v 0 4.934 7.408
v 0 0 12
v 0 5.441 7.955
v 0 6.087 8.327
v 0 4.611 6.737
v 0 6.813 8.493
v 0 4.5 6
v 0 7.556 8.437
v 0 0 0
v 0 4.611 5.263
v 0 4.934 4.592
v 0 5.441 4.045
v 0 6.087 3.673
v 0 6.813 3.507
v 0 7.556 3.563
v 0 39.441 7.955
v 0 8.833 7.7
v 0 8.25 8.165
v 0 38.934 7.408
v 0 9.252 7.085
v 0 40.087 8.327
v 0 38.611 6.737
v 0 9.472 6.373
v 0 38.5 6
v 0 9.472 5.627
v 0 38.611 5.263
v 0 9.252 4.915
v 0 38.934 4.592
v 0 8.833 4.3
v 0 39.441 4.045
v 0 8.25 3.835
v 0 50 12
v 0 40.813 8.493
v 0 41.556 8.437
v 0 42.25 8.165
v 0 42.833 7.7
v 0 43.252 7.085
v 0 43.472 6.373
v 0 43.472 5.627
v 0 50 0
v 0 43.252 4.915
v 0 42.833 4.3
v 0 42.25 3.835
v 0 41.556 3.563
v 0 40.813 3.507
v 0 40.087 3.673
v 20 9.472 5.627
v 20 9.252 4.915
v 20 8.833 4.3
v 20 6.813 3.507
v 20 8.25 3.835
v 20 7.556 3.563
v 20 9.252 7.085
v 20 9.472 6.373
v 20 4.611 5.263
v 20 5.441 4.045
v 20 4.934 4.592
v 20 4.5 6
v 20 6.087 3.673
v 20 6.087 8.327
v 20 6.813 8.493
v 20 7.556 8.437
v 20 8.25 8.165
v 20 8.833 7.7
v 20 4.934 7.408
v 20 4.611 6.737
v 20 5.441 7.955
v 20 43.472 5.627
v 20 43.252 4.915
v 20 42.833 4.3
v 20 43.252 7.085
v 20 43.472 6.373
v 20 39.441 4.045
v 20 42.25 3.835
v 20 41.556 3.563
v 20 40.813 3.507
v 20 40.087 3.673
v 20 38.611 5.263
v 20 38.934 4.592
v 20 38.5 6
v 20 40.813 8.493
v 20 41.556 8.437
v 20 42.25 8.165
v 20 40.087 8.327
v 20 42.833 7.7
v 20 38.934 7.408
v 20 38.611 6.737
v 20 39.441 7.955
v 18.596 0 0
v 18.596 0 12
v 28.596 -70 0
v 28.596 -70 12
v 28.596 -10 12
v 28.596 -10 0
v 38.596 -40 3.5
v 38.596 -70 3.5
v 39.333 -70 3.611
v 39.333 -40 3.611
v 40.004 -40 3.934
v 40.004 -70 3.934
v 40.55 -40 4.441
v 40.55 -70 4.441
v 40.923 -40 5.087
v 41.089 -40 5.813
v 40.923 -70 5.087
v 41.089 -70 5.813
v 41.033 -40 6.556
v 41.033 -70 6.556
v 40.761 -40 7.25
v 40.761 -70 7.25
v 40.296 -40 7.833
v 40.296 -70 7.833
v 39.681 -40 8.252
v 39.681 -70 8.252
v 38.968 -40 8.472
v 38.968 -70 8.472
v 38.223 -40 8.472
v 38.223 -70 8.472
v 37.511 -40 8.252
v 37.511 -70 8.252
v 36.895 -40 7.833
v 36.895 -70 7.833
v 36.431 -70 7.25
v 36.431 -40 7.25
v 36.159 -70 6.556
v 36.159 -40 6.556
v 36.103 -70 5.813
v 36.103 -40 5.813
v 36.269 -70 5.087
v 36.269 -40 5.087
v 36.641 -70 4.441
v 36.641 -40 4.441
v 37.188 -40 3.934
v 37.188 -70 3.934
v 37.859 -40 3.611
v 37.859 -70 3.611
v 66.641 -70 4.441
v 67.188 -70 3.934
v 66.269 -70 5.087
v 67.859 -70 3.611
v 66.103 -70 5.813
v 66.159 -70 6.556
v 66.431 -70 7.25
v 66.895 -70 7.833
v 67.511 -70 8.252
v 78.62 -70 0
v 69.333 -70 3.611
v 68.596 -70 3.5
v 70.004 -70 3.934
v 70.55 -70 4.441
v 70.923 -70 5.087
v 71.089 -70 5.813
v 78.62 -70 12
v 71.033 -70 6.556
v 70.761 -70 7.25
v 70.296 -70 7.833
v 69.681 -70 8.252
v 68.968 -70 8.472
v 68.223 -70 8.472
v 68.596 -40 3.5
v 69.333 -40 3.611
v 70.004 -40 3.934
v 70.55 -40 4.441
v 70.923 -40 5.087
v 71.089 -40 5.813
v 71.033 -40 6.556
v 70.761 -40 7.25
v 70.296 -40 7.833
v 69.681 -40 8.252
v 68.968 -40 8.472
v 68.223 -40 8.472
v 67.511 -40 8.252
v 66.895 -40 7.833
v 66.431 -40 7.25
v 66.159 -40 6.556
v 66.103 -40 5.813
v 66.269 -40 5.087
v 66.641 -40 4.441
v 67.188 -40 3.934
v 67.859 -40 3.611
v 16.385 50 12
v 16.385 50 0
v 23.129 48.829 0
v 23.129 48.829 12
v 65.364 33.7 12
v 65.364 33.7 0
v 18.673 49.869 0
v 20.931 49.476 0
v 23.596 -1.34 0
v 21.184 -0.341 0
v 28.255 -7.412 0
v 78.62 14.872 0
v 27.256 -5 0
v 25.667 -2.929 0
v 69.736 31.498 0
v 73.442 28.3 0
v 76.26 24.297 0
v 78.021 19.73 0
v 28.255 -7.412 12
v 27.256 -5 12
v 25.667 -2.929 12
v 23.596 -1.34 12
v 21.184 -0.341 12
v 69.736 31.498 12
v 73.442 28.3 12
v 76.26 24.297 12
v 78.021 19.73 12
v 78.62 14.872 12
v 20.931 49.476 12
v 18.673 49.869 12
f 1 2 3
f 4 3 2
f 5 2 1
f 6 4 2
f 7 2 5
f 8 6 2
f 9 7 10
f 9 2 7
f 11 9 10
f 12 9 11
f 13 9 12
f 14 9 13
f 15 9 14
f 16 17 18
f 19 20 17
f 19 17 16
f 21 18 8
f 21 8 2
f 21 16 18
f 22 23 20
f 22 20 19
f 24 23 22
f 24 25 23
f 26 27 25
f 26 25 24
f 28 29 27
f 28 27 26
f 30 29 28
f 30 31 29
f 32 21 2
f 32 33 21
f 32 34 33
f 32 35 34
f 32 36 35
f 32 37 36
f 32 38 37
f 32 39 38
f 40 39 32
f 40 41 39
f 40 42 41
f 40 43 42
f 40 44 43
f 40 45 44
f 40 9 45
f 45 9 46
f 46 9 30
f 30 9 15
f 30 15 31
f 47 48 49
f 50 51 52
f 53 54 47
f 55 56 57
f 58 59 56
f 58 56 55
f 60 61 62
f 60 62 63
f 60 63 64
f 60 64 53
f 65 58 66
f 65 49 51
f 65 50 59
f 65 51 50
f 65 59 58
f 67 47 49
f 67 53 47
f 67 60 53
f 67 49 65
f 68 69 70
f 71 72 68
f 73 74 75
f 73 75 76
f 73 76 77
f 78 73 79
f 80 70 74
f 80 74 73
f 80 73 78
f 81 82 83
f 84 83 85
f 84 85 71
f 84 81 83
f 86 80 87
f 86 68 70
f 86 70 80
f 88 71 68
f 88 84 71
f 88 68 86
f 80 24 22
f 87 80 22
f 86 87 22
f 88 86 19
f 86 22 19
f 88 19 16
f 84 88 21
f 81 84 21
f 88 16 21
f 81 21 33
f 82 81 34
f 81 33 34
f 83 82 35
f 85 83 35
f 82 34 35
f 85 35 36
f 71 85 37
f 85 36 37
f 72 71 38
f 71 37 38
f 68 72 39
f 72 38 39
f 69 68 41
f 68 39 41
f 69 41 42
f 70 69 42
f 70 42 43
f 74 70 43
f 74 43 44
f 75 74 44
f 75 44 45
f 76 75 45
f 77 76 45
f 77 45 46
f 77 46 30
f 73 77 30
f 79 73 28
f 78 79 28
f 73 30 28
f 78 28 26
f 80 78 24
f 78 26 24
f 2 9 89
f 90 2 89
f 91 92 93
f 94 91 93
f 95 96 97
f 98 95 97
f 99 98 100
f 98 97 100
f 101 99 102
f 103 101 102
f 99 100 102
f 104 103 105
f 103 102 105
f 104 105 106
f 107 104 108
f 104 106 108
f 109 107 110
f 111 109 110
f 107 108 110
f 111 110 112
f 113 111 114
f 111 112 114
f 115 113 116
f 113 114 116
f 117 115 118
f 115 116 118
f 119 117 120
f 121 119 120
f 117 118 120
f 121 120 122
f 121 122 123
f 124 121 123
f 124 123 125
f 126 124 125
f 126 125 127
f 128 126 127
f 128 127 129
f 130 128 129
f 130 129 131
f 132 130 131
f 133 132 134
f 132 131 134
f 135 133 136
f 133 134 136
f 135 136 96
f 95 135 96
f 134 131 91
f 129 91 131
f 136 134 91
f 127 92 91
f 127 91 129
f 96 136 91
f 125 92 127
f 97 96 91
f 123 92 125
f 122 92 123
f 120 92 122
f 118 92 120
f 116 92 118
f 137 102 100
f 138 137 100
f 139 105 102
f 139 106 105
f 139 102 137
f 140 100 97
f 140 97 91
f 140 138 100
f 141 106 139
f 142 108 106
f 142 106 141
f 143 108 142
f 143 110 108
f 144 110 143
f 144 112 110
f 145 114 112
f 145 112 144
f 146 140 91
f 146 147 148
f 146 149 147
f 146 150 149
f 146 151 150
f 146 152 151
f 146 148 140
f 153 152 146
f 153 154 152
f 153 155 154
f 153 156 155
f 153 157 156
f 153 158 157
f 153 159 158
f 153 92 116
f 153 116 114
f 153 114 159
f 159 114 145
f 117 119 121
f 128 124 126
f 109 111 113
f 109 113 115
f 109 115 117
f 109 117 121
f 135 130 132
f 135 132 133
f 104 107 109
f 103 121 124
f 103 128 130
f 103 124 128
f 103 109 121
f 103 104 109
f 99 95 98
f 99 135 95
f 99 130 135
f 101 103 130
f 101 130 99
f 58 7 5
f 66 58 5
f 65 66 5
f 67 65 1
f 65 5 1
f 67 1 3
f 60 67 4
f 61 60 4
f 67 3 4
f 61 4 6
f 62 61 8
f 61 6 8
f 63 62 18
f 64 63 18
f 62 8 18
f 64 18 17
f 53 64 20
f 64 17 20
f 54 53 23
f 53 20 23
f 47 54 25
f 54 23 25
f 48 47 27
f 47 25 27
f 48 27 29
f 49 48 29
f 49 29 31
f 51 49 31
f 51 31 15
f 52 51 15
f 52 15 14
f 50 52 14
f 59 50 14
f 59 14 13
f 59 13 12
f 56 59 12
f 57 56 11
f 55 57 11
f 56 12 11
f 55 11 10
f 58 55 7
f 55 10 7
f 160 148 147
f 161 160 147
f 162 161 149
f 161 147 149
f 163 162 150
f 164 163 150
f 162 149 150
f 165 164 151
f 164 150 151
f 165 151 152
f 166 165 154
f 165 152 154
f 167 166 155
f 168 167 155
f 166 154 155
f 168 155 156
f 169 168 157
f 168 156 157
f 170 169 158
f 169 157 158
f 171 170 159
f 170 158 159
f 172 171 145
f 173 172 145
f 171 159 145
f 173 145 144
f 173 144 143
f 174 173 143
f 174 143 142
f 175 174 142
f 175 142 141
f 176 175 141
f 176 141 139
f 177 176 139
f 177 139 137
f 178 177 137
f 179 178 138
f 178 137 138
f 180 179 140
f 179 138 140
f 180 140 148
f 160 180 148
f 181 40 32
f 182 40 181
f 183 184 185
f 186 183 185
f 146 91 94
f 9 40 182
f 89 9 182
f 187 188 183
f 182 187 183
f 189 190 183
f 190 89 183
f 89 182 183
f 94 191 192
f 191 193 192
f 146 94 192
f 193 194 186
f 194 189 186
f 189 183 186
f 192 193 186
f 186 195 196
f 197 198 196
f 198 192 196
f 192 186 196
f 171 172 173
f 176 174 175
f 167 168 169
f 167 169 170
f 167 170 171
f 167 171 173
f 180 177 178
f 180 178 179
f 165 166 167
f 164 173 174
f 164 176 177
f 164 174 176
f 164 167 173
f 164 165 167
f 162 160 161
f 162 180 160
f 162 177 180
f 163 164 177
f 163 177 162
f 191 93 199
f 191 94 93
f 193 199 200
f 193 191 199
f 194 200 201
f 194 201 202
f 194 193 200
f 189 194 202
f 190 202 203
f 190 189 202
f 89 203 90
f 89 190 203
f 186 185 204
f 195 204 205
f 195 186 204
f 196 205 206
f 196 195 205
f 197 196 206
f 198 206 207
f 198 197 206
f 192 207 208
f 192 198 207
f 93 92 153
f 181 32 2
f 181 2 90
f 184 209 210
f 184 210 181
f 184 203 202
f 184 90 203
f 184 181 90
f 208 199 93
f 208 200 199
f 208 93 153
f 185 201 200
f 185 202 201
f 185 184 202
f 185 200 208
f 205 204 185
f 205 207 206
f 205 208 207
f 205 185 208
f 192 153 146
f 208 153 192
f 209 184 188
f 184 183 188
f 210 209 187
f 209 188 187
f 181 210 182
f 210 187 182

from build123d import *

# Parameters (mm, degrees)
SKETCH_1_W          = 78.62
SKETCH_1_H          = 50
EXTRUDE_1_DEPTH     = 12
SKETCH_3_W          = 50.02416134
SKETCH_3_H          = 10
CUT_EXTRUDE_1_DEPTH = 94.942026804
FILLET_3_R          = 20
FILLET_4_R          = 20
SKETCH_5_R          = 2.5
CUT_EXTRUDE_3_DEPTH = 20
SKETCH_6_W          = 50.02416134
SKETCH_6_H          = 80
EXTRUDE_2_DEPTH     = 12
FILLET_5_R          = 10
SKETCH_7_R          = 2.5
CUT_EXTRUDE_4_DEPTH = 30


with BuildPart() as part:
    # Эскиз1 → Бобышка-Вытянуть1 (new body)
    with BuildSketch(Plane.XY):
        with Locations((39.31, 25)):
            Rectangle(SKETCH_1_W, SKETCH_1_H)
    extrude(amount=EXTRUDE_1_DEPTH)

    # Эскиз3 → Вырез-Вытянуть1 (cut, through all)
    with BuildSketch(Plane.XY.offset(12)):
        Polygon((19.858926821, 50), (78.62, 28.952063791), (78.62, 50), align=None)
        with Locations((53.60791933, 5)):
            Rectangle(SKETCH_3_W, SKETCH_3_H)
    extrude(amount=-CUT_EXTRUDE_1_DEPTH, mode=Mode.SUBTRACT)

    # Скругление3
    fillet_3_edges = [part.edges().sort_by_distance(p)[0] for p in [
        (78.62, 28.952063791, 6),
    ]]
    fillet(fillet_3_edges, radius=FILLET_3_R)

    # Скругление4
    fillet_4_edges = [part.edges().sort_by_distance(p)[0] for p in [
        (19.858926821, 50, 6),
    ]]
    fillet(fillet_4_edges, radius=FILLET_4_R)

    # Эскиз5 → Вырез-Вытянуть3 (cut)
    with BuildSketch(Plane.ZY):
        with Locations(Location((6, 7, 0), (0, 0, 270))):
            Circle(SKETCH_5_R)
        with Locations(Location((6, 41, 0), (0, 0, 270))):
            Circle(SKETCH_5_R)
    extrude(amount=-CUT_EXTRUDE_3_DEPTH, mode=Mode.SUBTRACT)

    # Эскиз6 → Бобышка-Вытянуть2 (add)
    with BuildSketch(Plane.XY.offset(12)):
        with Locations((53.60791933, -30)):
            Rectangle(SKETCH_6_W, SKETCH_6_H)
    extrude(amount=-EXTRUDE_2_DEPTH)

    # Скругление5
    fillet_5_edges = [part.edges().sort_by_distance(p)[0] for p in [
        (28.59583866, 0, 6),
    ]]
    fillet(fillet_5_edges, radius=FILLET_5_R)

    # Эскиз7 → Вырез-Вытянуть4 (cut)
    with BuildSketch(Plane.XZ.offset(70)):
        with Locations(Location((38.59583866, 6, 0), (0, 0, 270))):
            Circle(SKETCH_7_R)
        with Locations(Location((68.59583866, 6, 0), (0, 0, 270))):
            Circle(SKETCH_7_R)
    extrude(amount=-CUT_EXTRUDE_4_DEPTH, mode=Mode.SUBTRACT)


solid = part.part
